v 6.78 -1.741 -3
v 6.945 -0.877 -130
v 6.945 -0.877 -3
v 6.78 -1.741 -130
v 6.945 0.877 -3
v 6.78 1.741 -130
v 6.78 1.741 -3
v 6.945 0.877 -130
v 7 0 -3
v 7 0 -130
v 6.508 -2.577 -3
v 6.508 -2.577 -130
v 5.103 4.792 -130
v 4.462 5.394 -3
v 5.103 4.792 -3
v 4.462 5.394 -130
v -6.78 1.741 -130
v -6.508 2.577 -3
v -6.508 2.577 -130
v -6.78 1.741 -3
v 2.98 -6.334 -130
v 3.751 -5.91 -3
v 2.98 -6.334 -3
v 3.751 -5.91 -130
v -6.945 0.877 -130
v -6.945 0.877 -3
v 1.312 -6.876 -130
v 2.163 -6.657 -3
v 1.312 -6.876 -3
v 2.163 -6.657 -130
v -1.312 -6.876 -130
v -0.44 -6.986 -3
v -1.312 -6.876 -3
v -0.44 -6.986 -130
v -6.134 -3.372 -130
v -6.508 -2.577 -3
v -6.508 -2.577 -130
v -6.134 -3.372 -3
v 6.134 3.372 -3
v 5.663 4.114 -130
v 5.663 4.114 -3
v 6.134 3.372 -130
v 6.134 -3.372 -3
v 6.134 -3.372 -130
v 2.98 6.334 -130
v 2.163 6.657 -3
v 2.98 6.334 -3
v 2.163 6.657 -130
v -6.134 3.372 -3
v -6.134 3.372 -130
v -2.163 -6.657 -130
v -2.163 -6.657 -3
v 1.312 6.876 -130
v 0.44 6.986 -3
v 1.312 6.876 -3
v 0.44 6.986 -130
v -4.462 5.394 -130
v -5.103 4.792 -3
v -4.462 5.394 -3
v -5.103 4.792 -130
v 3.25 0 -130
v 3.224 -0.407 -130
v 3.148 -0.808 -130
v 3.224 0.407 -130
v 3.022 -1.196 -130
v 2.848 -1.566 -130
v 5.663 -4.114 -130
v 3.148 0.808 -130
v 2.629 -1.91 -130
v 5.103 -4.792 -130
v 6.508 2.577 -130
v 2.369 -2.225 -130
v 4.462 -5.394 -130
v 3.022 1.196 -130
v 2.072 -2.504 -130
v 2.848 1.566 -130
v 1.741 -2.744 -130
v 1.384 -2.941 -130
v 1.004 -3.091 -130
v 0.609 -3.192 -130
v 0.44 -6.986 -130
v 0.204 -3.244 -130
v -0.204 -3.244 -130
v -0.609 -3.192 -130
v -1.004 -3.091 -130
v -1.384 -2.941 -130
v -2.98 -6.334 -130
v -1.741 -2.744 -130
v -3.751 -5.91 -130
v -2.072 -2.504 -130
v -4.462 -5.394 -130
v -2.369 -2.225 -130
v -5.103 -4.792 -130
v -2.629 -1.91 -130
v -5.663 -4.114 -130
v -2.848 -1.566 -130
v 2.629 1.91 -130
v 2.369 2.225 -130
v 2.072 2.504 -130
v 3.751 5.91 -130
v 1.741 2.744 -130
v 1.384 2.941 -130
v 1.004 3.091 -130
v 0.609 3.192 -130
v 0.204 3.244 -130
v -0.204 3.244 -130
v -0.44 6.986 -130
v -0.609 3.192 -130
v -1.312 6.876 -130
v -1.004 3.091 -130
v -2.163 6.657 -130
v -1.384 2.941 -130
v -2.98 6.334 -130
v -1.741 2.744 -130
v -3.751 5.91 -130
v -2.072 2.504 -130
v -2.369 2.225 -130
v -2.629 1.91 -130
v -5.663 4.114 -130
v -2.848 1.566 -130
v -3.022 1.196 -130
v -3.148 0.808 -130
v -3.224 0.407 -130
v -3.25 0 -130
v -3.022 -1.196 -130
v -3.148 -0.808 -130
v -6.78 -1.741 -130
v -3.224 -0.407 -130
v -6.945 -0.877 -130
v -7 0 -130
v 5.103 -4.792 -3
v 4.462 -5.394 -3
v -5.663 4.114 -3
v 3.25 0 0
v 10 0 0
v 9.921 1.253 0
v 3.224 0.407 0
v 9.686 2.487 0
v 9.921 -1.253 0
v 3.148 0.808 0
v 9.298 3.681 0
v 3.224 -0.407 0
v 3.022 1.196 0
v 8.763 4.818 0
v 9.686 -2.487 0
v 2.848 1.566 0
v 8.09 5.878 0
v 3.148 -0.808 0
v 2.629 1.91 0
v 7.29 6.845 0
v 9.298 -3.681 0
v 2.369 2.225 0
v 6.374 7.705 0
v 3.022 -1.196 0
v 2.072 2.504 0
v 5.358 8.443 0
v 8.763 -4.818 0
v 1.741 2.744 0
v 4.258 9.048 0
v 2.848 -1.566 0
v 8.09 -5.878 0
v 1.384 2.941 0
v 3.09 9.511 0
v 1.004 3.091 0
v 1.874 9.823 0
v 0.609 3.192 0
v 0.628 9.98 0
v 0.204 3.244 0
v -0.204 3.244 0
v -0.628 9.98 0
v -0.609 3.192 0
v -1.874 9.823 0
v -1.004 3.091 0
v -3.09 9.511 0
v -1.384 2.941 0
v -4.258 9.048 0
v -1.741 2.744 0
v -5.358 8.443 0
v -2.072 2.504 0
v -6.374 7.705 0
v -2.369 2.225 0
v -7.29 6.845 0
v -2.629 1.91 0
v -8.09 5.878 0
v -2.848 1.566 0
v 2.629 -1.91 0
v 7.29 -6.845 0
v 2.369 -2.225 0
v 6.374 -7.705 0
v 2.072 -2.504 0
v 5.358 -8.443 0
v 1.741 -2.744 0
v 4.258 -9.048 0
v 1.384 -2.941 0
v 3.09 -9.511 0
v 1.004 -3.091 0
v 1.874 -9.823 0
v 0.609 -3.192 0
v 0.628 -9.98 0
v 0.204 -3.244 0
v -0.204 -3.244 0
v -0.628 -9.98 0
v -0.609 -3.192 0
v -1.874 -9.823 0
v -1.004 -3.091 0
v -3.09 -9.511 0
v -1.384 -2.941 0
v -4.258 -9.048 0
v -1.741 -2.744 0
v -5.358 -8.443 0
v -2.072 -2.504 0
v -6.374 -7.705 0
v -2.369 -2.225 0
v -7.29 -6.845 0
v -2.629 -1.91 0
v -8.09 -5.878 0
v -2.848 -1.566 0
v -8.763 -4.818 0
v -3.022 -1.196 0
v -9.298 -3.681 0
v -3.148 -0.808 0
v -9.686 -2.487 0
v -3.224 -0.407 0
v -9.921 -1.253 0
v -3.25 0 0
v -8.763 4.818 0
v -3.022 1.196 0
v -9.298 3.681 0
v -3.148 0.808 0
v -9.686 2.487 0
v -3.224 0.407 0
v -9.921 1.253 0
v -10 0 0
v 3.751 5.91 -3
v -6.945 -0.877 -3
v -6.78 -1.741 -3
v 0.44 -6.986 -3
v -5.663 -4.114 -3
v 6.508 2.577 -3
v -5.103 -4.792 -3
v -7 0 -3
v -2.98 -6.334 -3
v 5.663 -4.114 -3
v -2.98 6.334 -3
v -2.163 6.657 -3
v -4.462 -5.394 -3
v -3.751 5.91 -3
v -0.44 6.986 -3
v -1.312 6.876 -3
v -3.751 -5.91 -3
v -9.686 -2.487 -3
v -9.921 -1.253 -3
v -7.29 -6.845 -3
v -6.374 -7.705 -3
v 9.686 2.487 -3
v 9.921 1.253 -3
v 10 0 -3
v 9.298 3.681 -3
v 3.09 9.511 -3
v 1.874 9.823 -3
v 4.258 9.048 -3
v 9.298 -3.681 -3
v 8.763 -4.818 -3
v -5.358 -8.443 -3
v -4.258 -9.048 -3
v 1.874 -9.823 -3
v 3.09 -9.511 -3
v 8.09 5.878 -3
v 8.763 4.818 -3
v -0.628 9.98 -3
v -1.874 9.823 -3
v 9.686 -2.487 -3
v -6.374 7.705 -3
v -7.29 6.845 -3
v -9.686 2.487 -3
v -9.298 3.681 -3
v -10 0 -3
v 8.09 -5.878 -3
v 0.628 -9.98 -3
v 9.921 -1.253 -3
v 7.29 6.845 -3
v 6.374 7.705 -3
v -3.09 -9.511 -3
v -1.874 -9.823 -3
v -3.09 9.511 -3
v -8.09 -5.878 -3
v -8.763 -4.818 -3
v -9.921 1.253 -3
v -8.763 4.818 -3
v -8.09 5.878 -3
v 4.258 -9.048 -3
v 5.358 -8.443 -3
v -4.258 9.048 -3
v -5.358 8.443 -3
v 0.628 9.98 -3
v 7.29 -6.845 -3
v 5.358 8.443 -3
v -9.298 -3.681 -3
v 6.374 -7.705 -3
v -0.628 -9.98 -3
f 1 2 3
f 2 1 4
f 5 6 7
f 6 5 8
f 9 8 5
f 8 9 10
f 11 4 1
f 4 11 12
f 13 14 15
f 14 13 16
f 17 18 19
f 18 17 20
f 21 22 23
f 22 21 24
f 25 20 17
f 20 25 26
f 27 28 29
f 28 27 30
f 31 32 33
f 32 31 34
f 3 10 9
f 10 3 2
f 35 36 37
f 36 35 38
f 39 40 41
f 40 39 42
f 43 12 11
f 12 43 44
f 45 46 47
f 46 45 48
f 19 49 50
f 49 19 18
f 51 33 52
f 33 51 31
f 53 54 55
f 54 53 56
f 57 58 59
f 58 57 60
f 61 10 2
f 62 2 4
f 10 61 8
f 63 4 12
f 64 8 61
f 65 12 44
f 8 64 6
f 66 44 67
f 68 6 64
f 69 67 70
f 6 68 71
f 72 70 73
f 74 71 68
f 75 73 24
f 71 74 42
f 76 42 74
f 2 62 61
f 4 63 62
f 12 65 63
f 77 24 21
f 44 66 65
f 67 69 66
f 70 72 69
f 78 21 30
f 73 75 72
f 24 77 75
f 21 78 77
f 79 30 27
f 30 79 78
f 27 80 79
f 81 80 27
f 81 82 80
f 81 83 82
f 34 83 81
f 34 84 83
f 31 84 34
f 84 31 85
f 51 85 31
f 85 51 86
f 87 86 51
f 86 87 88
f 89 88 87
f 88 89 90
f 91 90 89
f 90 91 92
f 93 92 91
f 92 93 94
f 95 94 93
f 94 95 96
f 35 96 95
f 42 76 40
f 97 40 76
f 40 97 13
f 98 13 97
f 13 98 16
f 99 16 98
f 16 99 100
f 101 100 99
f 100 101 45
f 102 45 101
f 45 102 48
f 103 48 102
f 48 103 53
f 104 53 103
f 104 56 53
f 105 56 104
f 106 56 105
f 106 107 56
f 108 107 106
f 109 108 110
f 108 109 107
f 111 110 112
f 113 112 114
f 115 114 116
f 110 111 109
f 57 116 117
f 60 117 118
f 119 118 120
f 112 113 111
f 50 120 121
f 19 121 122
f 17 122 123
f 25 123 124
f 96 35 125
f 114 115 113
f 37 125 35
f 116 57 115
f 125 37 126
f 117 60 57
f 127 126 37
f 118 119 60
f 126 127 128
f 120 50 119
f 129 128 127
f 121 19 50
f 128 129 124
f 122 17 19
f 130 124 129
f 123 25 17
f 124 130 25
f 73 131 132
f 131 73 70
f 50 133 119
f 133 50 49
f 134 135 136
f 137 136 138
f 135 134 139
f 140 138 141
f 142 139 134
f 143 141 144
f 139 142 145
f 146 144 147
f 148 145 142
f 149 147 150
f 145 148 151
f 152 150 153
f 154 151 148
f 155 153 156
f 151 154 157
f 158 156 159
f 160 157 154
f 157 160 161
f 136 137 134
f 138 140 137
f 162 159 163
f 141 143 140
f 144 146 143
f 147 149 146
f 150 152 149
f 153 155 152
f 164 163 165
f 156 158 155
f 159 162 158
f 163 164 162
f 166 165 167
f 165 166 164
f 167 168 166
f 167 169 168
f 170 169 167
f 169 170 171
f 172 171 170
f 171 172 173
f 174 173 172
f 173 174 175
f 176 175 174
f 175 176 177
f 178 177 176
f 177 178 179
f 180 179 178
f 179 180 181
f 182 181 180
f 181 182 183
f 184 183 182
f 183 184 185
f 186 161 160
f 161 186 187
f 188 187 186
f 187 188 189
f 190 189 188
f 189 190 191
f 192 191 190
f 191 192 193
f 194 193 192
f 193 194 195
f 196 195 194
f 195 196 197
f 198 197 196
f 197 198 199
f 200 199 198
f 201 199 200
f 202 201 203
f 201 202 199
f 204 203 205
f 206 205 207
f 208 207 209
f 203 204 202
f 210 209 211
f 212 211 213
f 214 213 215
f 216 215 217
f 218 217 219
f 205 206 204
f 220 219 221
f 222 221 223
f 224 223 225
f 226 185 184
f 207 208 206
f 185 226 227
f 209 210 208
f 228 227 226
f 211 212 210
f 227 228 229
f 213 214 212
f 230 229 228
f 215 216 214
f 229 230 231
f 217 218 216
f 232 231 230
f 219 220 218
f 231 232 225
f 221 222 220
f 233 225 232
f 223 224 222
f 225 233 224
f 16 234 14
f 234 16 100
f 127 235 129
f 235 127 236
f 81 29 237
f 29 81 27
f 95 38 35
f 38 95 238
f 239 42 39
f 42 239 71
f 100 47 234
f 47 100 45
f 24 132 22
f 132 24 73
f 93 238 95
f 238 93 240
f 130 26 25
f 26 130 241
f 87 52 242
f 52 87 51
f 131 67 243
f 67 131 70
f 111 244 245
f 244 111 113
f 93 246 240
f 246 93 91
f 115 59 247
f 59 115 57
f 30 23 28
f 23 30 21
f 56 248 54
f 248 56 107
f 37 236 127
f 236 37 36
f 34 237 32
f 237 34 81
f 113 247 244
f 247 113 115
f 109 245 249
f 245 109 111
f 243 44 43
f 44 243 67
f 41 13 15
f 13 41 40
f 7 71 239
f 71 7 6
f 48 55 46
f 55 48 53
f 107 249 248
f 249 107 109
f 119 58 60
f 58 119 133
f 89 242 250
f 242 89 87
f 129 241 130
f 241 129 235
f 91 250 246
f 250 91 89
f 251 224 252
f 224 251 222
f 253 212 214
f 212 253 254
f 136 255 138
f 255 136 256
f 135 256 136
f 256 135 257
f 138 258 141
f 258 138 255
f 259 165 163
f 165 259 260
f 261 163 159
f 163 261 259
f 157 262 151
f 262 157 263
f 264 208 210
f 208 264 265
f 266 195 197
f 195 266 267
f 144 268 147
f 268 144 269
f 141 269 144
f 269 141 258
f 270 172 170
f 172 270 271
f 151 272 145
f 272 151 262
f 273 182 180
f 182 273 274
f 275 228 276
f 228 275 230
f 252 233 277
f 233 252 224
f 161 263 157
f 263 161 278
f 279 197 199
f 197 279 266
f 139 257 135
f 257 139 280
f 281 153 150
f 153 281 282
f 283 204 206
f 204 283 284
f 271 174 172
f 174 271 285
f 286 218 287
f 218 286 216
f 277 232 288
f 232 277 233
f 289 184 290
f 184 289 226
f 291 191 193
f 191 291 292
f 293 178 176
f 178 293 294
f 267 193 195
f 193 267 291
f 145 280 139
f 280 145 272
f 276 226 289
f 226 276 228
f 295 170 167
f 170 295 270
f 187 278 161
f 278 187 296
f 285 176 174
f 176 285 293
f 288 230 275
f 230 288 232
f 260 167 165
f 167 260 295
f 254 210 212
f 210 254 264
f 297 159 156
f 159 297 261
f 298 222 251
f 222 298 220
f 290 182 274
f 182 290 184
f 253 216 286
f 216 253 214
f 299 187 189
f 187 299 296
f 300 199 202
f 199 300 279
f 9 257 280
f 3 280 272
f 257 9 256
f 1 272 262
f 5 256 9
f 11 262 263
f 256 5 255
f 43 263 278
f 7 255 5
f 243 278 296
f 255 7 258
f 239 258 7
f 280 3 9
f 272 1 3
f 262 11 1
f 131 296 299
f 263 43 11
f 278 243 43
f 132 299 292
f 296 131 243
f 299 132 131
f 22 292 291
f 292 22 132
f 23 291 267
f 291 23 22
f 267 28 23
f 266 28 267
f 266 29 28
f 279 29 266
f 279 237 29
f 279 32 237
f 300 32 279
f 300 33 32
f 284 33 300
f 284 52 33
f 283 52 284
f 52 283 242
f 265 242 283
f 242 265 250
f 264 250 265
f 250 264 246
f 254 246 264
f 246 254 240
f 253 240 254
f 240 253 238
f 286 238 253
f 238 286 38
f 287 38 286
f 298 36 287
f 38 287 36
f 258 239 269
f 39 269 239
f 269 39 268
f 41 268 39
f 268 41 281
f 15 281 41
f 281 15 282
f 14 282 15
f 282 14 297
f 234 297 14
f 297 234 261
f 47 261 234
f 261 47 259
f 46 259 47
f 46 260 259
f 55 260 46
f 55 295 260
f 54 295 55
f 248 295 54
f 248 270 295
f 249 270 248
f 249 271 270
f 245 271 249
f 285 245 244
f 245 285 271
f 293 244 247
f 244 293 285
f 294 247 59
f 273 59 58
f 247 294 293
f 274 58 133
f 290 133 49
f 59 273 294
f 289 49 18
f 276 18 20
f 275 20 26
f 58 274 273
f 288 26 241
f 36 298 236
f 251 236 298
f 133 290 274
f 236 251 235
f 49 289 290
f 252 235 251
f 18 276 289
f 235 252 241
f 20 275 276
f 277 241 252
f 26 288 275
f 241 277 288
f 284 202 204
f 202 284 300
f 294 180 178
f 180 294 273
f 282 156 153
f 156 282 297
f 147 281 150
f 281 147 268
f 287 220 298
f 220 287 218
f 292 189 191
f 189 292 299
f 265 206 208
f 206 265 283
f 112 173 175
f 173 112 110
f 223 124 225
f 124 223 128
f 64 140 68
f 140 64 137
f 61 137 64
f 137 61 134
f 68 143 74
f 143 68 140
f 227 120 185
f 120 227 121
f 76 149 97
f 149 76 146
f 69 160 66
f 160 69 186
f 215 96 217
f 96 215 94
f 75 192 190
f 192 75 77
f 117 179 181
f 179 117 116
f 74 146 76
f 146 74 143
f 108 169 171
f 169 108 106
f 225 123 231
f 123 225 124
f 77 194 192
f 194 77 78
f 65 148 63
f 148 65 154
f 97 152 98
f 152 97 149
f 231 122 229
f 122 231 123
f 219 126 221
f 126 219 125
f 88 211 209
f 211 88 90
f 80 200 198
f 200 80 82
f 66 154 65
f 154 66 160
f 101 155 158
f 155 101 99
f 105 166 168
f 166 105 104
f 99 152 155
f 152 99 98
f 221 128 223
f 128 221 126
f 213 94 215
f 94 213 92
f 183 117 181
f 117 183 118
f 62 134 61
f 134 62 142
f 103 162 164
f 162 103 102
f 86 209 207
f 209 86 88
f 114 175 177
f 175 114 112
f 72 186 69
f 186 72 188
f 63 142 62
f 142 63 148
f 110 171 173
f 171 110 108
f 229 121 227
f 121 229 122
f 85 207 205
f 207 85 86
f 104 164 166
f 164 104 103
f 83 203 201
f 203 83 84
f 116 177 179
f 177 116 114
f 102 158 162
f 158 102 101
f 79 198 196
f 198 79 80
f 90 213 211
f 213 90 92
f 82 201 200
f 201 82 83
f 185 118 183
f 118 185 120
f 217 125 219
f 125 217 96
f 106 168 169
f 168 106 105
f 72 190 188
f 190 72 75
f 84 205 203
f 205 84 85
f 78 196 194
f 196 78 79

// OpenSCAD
$fn = 50;


difference() {
	union() {
		translate(v = [0, 0, -130.0000000000]) {
			cylinder(h = 130, r = 7.0000000000);
		}
		translate(v = [0, 0, -3.0000000000]) {
			cylinder(h = 3, r = 10.0000000000);
		}
	}
	union() {
		#translate(v = [0, 0, -130]) {
			cylinder(h = 130, r = 3.2500000000);
		}
	}
}
